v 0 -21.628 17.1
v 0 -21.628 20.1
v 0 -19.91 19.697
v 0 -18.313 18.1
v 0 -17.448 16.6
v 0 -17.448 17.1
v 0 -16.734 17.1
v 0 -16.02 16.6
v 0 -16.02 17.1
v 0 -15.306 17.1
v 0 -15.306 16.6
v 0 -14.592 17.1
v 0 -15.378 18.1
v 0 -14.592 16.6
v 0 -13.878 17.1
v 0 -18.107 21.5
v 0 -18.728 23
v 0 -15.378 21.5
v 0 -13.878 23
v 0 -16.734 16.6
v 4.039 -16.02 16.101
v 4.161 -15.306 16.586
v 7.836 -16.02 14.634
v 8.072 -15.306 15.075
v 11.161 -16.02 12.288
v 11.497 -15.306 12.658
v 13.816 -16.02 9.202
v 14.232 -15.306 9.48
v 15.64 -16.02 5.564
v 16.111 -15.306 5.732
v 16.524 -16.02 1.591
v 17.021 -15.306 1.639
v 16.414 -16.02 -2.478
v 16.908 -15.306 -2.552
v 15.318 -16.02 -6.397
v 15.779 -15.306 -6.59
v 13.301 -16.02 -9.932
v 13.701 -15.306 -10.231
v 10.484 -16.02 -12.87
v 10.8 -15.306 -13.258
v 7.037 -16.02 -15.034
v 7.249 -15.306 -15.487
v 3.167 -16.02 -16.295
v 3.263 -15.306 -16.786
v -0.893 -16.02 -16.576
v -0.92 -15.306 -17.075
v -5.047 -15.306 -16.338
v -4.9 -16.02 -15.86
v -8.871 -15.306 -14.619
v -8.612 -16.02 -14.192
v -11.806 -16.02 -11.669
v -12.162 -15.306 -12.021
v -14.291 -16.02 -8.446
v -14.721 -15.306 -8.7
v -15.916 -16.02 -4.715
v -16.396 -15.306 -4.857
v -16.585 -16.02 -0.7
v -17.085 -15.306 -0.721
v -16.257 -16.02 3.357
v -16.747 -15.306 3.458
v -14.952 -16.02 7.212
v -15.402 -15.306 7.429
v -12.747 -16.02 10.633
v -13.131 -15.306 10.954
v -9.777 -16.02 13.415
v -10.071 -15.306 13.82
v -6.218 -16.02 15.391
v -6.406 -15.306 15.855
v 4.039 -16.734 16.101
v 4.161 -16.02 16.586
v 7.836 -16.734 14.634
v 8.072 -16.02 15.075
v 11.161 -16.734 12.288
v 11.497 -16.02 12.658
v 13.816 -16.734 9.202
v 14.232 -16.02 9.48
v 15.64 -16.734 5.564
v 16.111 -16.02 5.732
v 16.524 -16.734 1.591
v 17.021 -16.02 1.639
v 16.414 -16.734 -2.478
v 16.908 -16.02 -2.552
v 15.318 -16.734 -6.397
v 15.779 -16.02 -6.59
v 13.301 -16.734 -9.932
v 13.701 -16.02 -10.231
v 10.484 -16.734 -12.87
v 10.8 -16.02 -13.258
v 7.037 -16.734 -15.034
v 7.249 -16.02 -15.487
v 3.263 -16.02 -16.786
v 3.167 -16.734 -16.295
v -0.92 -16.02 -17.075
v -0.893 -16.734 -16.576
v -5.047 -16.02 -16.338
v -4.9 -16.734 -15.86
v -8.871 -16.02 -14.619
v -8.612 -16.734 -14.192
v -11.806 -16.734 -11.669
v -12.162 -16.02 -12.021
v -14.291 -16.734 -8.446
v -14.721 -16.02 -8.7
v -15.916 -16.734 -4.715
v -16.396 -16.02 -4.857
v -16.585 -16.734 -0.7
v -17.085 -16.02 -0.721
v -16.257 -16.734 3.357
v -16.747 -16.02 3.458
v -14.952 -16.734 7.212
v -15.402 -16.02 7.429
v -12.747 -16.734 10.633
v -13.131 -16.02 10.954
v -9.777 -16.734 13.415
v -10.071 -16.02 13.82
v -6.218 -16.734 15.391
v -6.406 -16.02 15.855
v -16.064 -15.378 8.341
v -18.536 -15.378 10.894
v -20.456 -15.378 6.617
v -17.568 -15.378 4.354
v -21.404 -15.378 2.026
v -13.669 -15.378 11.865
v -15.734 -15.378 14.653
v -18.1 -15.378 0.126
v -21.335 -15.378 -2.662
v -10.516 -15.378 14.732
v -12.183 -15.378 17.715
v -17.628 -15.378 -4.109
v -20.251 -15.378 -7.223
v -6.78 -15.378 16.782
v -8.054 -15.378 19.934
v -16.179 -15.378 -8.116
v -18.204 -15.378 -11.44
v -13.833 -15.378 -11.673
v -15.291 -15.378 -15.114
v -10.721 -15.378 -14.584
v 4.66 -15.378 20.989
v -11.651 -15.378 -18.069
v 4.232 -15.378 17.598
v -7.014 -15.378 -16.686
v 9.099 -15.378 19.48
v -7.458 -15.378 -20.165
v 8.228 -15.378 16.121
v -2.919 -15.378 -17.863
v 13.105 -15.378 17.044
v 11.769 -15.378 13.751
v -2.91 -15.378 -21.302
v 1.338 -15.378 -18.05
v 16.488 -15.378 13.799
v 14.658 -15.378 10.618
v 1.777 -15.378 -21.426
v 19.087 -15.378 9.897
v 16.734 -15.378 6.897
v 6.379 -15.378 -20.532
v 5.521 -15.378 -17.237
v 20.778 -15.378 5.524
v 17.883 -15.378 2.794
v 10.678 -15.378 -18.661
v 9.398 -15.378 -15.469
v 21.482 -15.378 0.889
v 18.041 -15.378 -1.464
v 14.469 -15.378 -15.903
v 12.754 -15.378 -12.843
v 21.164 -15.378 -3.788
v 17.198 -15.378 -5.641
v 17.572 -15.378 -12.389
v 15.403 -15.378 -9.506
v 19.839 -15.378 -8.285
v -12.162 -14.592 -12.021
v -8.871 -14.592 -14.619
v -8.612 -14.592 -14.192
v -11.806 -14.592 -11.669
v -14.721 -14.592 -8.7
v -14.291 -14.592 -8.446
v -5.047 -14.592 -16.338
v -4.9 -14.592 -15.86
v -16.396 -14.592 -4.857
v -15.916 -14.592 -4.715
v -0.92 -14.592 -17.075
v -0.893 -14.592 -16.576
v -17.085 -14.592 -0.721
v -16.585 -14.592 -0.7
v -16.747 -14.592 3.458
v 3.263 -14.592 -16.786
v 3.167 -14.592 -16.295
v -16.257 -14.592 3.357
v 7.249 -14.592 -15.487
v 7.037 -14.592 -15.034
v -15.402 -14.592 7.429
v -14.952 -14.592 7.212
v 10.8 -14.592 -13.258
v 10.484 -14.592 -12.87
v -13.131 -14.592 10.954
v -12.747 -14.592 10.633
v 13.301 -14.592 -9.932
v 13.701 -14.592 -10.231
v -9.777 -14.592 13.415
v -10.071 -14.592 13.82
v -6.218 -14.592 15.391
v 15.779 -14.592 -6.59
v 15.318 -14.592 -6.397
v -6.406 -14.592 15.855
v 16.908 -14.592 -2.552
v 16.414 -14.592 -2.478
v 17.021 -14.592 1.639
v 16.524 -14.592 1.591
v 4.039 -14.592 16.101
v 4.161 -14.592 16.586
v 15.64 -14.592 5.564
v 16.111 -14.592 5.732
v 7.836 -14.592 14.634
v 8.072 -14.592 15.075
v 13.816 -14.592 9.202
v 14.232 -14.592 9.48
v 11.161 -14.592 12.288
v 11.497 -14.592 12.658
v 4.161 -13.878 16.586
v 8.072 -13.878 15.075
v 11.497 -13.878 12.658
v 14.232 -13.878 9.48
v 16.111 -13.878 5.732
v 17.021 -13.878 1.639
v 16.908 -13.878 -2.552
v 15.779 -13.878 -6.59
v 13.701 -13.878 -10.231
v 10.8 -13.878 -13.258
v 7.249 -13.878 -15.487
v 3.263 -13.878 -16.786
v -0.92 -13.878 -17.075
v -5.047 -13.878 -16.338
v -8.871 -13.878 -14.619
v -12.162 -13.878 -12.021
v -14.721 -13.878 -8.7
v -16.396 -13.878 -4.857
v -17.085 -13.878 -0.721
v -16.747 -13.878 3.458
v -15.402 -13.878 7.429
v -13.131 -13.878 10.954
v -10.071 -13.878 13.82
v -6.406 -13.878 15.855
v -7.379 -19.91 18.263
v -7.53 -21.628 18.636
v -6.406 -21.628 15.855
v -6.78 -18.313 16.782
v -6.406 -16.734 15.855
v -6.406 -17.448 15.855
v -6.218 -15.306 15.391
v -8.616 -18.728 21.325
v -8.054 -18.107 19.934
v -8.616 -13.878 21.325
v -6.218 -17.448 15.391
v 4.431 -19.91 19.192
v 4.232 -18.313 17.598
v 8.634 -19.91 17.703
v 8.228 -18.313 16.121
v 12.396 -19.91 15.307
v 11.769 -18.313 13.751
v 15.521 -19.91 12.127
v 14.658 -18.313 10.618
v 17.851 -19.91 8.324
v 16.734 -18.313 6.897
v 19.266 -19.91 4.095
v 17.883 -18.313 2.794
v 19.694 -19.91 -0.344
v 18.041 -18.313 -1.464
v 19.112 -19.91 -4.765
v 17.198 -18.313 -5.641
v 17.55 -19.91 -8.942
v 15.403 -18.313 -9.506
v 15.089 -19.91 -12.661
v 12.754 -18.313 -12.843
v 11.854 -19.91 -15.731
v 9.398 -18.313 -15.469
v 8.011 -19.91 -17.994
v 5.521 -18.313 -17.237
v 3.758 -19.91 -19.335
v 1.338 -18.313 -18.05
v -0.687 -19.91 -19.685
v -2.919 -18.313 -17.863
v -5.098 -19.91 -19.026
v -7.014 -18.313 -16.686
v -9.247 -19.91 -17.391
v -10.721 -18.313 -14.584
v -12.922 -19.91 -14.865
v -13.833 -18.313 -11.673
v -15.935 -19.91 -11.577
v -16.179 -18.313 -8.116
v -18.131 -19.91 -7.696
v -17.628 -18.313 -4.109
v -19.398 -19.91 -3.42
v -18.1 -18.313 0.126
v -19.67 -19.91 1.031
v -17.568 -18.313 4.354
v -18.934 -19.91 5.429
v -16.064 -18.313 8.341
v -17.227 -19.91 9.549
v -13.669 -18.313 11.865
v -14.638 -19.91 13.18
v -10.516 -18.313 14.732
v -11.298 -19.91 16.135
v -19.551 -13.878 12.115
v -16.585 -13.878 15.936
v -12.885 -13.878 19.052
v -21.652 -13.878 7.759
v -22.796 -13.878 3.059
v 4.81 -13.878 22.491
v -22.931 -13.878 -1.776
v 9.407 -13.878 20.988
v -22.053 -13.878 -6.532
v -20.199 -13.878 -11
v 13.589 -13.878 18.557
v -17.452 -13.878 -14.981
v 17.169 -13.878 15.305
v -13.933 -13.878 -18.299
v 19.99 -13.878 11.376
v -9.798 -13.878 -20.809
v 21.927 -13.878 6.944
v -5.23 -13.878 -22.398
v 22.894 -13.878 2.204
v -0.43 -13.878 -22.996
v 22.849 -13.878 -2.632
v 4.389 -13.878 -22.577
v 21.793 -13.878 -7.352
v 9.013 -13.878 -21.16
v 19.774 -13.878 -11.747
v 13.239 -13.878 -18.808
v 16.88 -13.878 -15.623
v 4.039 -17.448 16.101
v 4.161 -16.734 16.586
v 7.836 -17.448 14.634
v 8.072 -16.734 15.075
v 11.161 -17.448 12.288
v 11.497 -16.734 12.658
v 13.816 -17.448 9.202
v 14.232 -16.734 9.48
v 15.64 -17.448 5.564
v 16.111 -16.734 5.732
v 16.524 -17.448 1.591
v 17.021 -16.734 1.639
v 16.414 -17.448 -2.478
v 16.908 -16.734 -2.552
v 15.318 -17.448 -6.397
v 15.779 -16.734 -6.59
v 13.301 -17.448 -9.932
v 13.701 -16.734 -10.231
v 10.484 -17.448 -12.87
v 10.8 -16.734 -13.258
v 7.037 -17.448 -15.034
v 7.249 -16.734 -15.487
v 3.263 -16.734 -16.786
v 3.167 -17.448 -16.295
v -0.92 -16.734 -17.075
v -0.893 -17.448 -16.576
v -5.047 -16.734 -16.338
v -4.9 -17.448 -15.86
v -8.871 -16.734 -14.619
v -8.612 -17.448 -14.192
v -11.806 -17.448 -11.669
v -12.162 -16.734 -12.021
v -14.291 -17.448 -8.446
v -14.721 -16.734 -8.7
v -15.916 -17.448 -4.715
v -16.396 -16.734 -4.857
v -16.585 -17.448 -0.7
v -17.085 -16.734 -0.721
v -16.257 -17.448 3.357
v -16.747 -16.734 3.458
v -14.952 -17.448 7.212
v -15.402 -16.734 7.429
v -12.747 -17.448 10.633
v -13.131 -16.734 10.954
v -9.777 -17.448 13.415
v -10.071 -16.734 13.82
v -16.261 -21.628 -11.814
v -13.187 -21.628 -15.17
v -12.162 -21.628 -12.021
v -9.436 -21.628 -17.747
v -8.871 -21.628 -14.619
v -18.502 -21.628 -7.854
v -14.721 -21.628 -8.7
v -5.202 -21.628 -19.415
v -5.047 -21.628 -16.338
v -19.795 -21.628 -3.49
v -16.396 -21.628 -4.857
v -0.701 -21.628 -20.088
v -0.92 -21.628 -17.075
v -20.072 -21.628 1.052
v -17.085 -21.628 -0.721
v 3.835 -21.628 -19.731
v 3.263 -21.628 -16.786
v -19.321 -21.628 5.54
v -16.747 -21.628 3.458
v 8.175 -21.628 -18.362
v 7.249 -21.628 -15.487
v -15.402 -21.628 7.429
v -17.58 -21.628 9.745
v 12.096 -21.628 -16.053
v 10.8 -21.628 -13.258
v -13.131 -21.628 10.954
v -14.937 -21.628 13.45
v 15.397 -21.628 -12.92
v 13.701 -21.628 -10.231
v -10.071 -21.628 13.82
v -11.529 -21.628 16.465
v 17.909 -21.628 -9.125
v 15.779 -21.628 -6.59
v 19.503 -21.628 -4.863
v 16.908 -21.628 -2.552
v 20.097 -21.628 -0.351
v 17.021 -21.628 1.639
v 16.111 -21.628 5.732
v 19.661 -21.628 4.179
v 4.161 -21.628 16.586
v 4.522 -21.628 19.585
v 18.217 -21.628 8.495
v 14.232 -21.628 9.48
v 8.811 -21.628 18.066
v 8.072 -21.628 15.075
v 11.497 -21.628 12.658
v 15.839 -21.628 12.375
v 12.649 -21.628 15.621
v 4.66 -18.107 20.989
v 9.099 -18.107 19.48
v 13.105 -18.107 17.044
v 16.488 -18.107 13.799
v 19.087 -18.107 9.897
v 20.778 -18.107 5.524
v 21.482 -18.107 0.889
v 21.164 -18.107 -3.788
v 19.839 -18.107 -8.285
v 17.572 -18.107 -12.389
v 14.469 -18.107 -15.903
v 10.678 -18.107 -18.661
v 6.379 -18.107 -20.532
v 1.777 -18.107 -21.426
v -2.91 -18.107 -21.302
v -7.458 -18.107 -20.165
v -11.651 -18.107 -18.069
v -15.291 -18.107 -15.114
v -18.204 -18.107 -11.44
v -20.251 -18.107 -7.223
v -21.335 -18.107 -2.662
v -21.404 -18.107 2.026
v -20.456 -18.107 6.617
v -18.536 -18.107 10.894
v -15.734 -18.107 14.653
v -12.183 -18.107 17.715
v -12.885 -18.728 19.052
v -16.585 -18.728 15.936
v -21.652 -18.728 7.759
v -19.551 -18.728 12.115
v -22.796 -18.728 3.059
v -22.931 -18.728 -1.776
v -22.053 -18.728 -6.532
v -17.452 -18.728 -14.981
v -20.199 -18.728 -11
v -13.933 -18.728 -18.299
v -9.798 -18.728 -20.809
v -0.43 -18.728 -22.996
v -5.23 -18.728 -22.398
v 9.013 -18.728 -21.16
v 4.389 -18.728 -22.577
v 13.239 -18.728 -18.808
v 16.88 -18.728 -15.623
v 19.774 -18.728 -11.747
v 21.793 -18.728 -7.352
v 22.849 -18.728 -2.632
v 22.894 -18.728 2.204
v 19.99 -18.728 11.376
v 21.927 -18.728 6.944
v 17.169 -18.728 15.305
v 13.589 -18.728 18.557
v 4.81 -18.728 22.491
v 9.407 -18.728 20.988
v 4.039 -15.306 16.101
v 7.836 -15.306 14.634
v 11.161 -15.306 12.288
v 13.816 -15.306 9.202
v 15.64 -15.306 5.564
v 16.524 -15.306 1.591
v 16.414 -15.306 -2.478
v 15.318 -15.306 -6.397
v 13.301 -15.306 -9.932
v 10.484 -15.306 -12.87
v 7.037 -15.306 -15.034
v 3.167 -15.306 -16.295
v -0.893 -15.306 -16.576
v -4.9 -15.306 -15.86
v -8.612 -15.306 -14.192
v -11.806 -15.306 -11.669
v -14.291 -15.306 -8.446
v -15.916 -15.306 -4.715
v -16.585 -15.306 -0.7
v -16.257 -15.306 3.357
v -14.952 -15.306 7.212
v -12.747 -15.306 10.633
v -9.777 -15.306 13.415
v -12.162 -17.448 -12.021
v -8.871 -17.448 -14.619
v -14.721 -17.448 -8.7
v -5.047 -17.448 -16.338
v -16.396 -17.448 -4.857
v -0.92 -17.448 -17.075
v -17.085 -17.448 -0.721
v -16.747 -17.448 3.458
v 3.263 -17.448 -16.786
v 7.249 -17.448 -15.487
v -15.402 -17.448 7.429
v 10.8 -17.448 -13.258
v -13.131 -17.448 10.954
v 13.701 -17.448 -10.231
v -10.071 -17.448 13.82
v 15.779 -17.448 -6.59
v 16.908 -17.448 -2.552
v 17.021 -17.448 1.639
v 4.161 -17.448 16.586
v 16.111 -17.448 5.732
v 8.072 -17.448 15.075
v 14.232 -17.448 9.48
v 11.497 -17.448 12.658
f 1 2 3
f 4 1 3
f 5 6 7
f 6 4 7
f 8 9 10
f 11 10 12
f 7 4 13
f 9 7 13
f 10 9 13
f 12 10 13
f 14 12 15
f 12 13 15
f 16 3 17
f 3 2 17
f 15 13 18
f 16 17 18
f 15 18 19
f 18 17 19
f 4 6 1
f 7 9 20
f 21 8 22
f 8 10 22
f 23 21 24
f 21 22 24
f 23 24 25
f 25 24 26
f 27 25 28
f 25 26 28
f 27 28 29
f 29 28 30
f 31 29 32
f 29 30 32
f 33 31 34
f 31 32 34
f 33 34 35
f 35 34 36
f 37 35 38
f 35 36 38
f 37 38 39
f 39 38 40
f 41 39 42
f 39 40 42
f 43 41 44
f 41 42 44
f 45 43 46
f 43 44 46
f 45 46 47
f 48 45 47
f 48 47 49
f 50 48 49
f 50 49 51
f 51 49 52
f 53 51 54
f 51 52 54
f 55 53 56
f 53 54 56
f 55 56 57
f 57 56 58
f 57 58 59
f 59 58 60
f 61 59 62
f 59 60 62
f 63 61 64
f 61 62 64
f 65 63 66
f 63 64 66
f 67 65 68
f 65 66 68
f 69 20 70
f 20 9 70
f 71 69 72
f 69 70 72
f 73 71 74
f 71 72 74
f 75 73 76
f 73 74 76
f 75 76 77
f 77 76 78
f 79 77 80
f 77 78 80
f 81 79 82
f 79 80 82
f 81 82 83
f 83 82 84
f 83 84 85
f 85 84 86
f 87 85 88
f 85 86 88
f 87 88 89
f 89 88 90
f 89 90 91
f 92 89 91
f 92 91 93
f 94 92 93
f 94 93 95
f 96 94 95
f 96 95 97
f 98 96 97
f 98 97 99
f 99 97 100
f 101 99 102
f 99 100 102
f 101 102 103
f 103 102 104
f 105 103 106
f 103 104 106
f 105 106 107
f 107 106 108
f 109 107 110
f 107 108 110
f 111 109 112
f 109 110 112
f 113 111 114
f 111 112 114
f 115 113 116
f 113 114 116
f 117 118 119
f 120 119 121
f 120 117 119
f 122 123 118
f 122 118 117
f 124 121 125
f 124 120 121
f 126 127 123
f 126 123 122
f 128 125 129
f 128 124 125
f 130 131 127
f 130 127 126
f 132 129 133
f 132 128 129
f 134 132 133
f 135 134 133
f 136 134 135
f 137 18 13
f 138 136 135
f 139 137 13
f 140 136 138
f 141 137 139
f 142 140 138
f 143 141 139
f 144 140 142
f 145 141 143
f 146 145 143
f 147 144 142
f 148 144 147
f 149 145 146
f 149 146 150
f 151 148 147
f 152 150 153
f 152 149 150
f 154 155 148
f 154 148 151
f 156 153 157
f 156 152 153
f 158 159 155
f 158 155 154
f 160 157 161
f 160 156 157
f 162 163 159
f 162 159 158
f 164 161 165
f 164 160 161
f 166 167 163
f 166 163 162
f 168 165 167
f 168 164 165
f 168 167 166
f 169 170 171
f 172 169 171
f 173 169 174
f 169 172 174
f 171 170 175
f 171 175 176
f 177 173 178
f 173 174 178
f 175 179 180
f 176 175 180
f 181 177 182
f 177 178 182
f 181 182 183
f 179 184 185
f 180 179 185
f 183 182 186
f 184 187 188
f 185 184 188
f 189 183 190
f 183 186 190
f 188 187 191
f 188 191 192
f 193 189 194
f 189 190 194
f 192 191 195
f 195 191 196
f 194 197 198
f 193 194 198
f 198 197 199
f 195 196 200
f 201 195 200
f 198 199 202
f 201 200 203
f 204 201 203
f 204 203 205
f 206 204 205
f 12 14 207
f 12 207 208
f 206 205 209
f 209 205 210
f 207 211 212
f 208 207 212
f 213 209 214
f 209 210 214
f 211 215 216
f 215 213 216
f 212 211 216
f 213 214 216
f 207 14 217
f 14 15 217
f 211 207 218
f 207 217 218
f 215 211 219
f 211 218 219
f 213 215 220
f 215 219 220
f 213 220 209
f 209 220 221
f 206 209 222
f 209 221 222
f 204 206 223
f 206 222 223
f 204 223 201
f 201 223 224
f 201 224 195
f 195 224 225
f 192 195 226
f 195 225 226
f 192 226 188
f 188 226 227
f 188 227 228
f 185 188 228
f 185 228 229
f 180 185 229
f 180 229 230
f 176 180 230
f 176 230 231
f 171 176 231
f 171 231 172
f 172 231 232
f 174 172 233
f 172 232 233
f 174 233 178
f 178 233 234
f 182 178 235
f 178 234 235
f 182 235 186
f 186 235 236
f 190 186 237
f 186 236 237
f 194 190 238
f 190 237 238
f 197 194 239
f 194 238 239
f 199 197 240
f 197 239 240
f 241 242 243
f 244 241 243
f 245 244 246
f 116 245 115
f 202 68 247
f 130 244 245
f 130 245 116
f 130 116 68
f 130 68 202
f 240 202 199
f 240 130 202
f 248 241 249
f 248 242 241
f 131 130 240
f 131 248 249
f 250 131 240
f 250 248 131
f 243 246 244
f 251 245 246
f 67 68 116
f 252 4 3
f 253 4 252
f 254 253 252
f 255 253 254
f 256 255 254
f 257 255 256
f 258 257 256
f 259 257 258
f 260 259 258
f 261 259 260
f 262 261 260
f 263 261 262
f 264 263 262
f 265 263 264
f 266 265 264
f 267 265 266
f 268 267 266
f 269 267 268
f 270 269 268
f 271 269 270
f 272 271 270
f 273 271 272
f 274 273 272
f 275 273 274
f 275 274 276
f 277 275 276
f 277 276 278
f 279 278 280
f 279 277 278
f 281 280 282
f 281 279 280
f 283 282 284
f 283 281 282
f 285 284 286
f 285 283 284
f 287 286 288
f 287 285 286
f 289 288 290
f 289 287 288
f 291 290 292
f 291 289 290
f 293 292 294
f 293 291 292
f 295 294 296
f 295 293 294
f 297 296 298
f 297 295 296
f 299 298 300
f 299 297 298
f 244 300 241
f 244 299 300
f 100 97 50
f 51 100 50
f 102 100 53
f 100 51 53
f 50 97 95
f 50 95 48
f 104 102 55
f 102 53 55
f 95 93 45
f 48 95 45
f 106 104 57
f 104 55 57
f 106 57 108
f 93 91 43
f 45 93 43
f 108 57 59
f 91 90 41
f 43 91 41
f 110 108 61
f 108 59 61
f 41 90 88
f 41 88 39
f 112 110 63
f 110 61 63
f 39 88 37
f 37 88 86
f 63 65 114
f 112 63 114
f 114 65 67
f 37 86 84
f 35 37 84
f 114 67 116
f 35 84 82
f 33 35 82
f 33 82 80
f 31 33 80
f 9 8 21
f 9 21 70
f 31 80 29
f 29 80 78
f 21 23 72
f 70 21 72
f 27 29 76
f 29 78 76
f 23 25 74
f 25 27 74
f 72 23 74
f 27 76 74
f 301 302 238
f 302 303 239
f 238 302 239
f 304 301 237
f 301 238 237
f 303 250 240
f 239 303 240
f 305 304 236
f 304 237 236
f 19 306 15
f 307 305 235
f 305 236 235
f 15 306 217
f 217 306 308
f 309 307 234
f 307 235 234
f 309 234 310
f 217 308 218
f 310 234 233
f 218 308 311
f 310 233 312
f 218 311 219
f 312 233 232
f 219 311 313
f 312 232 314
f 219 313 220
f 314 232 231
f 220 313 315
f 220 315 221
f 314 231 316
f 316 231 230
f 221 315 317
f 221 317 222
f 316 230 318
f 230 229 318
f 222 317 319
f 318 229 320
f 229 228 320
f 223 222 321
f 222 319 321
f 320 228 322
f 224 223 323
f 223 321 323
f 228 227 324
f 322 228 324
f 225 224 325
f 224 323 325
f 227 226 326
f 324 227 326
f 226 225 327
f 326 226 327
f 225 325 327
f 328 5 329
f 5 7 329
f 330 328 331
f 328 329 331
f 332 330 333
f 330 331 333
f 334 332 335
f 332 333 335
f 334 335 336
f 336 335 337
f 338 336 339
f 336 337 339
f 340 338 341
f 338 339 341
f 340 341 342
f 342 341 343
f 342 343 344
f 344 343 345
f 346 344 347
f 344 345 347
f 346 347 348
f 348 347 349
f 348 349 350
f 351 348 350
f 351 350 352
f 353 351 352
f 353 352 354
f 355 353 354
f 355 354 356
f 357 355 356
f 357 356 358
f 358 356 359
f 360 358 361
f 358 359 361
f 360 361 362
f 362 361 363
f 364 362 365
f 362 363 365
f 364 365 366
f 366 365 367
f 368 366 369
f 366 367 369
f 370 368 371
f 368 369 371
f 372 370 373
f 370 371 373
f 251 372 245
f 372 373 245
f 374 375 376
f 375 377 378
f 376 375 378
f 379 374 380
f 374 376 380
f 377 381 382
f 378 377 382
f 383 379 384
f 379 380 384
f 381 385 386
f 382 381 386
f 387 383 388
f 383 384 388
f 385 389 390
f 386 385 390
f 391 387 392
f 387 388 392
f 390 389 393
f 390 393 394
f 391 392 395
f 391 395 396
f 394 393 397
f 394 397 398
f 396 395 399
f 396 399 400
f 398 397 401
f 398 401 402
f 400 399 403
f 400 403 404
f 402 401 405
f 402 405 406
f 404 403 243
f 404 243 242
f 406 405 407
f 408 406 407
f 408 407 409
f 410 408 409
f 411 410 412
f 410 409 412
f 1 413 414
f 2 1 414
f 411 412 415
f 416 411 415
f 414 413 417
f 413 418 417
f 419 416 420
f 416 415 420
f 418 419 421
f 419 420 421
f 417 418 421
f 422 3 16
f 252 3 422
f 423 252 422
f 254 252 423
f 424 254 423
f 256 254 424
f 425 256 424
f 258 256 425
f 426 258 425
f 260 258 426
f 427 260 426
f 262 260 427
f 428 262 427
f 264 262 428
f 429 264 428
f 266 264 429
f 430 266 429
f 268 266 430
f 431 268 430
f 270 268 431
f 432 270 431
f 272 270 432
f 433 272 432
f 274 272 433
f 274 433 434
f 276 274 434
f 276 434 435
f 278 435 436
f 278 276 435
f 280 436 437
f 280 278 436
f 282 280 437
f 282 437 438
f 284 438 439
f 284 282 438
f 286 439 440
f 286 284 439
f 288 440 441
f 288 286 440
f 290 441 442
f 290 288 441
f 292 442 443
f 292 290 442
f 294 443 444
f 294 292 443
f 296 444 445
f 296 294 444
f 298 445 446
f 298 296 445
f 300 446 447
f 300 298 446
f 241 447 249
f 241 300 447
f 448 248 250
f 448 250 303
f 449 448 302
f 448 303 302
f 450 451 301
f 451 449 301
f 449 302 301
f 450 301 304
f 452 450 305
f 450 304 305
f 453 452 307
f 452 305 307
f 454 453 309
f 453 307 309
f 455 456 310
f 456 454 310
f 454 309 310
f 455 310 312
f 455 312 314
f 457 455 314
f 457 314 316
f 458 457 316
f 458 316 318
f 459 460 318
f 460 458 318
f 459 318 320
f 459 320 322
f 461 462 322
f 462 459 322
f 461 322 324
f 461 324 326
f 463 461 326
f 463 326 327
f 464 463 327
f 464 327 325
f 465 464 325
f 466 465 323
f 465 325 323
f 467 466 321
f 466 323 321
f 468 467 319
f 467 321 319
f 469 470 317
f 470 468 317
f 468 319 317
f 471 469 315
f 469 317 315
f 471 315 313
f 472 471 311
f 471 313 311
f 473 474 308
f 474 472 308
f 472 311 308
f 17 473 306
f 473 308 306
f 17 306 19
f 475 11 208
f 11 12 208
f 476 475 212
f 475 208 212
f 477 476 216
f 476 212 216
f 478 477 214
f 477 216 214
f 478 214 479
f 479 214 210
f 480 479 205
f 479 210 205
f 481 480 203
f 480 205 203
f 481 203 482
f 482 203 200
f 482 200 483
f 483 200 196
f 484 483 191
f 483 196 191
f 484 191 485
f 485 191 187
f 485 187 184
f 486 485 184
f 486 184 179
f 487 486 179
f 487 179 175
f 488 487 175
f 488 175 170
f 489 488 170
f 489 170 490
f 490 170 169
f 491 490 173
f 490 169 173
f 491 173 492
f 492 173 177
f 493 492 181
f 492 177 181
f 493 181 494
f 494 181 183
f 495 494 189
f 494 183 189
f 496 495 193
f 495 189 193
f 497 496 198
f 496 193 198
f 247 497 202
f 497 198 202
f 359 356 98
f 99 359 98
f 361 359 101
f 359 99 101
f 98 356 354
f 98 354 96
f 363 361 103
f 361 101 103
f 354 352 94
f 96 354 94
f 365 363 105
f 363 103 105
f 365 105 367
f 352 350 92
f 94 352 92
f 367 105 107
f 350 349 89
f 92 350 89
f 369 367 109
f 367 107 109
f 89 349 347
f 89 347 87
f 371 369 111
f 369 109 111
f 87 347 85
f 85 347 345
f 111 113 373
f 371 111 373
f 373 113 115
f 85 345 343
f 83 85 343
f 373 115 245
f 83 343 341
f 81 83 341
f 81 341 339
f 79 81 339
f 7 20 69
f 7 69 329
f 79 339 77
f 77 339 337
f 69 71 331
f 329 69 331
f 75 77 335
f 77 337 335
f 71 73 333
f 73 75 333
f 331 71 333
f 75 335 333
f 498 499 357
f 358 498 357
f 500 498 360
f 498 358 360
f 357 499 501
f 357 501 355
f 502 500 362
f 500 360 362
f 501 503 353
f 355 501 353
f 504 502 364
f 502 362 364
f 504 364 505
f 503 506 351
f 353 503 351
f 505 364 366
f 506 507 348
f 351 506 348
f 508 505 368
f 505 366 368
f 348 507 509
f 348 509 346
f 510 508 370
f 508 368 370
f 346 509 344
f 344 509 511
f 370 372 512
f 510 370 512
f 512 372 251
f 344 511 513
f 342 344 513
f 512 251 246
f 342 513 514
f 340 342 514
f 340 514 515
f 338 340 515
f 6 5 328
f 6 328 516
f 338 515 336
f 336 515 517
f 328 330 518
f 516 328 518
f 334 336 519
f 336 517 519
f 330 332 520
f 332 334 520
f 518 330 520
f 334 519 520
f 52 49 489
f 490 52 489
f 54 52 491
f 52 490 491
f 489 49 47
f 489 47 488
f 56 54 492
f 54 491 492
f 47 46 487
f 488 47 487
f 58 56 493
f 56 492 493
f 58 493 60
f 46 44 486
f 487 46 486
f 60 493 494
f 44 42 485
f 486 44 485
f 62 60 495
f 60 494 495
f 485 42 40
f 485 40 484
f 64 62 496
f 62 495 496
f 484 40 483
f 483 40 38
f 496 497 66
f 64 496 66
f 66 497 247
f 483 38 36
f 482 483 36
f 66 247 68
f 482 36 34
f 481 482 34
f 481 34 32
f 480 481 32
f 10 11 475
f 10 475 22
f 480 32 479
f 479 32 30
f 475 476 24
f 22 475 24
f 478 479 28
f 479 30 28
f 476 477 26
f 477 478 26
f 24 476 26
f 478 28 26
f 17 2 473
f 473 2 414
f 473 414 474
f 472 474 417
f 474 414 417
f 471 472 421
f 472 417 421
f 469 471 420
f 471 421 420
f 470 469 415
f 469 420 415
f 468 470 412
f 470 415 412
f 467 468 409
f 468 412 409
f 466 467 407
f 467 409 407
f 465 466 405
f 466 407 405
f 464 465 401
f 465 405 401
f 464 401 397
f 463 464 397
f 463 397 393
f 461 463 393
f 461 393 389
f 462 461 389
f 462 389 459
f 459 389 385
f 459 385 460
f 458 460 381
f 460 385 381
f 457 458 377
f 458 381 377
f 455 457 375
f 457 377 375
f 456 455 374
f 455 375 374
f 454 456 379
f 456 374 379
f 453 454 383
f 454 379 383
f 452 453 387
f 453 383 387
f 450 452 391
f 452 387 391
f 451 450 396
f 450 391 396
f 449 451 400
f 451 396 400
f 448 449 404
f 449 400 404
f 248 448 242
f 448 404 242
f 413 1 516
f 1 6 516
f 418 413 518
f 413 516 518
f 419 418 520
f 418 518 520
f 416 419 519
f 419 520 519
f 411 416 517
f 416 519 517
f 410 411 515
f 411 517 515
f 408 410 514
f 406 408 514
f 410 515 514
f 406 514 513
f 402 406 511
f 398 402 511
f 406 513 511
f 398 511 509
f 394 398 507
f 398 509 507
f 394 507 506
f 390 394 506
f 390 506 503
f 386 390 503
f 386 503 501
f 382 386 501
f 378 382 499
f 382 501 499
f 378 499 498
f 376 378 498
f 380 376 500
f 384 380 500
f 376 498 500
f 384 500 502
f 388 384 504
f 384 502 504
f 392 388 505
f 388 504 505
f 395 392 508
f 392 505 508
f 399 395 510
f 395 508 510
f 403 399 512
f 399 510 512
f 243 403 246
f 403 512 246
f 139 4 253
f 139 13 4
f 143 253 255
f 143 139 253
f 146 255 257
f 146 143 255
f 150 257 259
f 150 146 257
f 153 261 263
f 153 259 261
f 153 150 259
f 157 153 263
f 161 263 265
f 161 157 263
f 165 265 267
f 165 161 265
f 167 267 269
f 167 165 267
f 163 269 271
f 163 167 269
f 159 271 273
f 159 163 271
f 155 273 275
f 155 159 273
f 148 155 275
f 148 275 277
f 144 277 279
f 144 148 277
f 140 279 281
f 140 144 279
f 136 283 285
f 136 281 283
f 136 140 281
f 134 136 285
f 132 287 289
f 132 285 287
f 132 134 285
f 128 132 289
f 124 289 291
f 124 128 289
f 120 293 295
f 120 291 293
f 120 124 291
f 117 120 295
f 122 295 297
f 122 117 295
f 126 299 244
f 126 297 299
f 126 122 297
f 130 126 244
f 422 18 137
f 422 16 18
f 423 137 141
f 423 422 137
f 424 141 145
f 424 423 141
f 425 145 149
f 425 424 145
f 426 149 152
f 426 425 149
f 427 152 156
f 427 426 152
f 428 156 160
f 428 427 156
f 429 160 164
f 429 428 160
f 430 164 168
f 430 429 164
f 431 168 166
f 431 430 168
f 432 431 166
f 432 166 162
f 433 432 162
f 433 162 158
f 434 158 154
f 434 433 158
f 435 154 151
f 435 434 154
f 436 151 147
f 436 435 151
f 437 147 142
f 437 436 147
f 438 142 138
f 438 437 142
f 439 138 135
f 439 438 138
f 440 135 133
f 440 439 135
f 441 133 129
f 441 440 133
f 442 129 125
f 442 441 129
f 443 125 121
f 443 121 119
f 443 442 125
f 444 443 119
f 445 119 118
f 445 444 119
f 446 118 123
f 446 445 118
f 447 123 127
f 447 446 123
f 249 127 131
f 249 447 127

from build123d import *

# Parameters (mm, degrees)
F2_ANGLE = 338
F3_R     = 43
F3_R_2   = 23
F4_DEPTH = 25


with BuildPart() as f2:
    # F1 (on Right) → F2 (revolve)
    with BuildSketch(Plane.YZ):
        Polygon((-14.592193, 16.6), (-13.878119, 17.1), (-13.878119, 26.85), (-14.878119, 26.85), (-21.628119, 20.1), (-21.628119, 17.1), (-17.448489, 17.1), (-17.448489, 16.6), (-16.734415, 17.1), (-16.734415, 16.6), (-16.020341, 17.1), (-16.020341, 16.6), (-15.306267, 17.1), (-15.306267, 16.6), (-14.592193, 17.1), align=None)
    revolve(axis=Axis((0, -8.217514, 0), (0, 1, 0)), revolution_arc=F2_ANGLE)

    # F3 (on Front) → F4 (cut)
    with BuildSketch(Plane.XZ):
        Circle(F3_R)
        Circle(F3_R_2, mode=Mode.SUBTRACT)
    extrude(amount=F4_DEPTH, mode=Mode.SUBTRACT)

    # F5 (on face) → F6 (revolve, cut)
    with BuildSketch(Plane(origin=(0, 0, 0), x_dir=(0, 1, 0), z_dir=(0.927184, 0, 0.374607))):
        Polygon((-15.378119, 18.1), (-15.378119, 21.5), (-18.106798, 21.5), (-19.910035, 19.696764), (-18.313271, 18.1), align=None)
    revolve(axis=Axis((0, -8.217514, 0), (0, 1, 0)), mode=Mode.SUBTRACT)


solid = f2.part
